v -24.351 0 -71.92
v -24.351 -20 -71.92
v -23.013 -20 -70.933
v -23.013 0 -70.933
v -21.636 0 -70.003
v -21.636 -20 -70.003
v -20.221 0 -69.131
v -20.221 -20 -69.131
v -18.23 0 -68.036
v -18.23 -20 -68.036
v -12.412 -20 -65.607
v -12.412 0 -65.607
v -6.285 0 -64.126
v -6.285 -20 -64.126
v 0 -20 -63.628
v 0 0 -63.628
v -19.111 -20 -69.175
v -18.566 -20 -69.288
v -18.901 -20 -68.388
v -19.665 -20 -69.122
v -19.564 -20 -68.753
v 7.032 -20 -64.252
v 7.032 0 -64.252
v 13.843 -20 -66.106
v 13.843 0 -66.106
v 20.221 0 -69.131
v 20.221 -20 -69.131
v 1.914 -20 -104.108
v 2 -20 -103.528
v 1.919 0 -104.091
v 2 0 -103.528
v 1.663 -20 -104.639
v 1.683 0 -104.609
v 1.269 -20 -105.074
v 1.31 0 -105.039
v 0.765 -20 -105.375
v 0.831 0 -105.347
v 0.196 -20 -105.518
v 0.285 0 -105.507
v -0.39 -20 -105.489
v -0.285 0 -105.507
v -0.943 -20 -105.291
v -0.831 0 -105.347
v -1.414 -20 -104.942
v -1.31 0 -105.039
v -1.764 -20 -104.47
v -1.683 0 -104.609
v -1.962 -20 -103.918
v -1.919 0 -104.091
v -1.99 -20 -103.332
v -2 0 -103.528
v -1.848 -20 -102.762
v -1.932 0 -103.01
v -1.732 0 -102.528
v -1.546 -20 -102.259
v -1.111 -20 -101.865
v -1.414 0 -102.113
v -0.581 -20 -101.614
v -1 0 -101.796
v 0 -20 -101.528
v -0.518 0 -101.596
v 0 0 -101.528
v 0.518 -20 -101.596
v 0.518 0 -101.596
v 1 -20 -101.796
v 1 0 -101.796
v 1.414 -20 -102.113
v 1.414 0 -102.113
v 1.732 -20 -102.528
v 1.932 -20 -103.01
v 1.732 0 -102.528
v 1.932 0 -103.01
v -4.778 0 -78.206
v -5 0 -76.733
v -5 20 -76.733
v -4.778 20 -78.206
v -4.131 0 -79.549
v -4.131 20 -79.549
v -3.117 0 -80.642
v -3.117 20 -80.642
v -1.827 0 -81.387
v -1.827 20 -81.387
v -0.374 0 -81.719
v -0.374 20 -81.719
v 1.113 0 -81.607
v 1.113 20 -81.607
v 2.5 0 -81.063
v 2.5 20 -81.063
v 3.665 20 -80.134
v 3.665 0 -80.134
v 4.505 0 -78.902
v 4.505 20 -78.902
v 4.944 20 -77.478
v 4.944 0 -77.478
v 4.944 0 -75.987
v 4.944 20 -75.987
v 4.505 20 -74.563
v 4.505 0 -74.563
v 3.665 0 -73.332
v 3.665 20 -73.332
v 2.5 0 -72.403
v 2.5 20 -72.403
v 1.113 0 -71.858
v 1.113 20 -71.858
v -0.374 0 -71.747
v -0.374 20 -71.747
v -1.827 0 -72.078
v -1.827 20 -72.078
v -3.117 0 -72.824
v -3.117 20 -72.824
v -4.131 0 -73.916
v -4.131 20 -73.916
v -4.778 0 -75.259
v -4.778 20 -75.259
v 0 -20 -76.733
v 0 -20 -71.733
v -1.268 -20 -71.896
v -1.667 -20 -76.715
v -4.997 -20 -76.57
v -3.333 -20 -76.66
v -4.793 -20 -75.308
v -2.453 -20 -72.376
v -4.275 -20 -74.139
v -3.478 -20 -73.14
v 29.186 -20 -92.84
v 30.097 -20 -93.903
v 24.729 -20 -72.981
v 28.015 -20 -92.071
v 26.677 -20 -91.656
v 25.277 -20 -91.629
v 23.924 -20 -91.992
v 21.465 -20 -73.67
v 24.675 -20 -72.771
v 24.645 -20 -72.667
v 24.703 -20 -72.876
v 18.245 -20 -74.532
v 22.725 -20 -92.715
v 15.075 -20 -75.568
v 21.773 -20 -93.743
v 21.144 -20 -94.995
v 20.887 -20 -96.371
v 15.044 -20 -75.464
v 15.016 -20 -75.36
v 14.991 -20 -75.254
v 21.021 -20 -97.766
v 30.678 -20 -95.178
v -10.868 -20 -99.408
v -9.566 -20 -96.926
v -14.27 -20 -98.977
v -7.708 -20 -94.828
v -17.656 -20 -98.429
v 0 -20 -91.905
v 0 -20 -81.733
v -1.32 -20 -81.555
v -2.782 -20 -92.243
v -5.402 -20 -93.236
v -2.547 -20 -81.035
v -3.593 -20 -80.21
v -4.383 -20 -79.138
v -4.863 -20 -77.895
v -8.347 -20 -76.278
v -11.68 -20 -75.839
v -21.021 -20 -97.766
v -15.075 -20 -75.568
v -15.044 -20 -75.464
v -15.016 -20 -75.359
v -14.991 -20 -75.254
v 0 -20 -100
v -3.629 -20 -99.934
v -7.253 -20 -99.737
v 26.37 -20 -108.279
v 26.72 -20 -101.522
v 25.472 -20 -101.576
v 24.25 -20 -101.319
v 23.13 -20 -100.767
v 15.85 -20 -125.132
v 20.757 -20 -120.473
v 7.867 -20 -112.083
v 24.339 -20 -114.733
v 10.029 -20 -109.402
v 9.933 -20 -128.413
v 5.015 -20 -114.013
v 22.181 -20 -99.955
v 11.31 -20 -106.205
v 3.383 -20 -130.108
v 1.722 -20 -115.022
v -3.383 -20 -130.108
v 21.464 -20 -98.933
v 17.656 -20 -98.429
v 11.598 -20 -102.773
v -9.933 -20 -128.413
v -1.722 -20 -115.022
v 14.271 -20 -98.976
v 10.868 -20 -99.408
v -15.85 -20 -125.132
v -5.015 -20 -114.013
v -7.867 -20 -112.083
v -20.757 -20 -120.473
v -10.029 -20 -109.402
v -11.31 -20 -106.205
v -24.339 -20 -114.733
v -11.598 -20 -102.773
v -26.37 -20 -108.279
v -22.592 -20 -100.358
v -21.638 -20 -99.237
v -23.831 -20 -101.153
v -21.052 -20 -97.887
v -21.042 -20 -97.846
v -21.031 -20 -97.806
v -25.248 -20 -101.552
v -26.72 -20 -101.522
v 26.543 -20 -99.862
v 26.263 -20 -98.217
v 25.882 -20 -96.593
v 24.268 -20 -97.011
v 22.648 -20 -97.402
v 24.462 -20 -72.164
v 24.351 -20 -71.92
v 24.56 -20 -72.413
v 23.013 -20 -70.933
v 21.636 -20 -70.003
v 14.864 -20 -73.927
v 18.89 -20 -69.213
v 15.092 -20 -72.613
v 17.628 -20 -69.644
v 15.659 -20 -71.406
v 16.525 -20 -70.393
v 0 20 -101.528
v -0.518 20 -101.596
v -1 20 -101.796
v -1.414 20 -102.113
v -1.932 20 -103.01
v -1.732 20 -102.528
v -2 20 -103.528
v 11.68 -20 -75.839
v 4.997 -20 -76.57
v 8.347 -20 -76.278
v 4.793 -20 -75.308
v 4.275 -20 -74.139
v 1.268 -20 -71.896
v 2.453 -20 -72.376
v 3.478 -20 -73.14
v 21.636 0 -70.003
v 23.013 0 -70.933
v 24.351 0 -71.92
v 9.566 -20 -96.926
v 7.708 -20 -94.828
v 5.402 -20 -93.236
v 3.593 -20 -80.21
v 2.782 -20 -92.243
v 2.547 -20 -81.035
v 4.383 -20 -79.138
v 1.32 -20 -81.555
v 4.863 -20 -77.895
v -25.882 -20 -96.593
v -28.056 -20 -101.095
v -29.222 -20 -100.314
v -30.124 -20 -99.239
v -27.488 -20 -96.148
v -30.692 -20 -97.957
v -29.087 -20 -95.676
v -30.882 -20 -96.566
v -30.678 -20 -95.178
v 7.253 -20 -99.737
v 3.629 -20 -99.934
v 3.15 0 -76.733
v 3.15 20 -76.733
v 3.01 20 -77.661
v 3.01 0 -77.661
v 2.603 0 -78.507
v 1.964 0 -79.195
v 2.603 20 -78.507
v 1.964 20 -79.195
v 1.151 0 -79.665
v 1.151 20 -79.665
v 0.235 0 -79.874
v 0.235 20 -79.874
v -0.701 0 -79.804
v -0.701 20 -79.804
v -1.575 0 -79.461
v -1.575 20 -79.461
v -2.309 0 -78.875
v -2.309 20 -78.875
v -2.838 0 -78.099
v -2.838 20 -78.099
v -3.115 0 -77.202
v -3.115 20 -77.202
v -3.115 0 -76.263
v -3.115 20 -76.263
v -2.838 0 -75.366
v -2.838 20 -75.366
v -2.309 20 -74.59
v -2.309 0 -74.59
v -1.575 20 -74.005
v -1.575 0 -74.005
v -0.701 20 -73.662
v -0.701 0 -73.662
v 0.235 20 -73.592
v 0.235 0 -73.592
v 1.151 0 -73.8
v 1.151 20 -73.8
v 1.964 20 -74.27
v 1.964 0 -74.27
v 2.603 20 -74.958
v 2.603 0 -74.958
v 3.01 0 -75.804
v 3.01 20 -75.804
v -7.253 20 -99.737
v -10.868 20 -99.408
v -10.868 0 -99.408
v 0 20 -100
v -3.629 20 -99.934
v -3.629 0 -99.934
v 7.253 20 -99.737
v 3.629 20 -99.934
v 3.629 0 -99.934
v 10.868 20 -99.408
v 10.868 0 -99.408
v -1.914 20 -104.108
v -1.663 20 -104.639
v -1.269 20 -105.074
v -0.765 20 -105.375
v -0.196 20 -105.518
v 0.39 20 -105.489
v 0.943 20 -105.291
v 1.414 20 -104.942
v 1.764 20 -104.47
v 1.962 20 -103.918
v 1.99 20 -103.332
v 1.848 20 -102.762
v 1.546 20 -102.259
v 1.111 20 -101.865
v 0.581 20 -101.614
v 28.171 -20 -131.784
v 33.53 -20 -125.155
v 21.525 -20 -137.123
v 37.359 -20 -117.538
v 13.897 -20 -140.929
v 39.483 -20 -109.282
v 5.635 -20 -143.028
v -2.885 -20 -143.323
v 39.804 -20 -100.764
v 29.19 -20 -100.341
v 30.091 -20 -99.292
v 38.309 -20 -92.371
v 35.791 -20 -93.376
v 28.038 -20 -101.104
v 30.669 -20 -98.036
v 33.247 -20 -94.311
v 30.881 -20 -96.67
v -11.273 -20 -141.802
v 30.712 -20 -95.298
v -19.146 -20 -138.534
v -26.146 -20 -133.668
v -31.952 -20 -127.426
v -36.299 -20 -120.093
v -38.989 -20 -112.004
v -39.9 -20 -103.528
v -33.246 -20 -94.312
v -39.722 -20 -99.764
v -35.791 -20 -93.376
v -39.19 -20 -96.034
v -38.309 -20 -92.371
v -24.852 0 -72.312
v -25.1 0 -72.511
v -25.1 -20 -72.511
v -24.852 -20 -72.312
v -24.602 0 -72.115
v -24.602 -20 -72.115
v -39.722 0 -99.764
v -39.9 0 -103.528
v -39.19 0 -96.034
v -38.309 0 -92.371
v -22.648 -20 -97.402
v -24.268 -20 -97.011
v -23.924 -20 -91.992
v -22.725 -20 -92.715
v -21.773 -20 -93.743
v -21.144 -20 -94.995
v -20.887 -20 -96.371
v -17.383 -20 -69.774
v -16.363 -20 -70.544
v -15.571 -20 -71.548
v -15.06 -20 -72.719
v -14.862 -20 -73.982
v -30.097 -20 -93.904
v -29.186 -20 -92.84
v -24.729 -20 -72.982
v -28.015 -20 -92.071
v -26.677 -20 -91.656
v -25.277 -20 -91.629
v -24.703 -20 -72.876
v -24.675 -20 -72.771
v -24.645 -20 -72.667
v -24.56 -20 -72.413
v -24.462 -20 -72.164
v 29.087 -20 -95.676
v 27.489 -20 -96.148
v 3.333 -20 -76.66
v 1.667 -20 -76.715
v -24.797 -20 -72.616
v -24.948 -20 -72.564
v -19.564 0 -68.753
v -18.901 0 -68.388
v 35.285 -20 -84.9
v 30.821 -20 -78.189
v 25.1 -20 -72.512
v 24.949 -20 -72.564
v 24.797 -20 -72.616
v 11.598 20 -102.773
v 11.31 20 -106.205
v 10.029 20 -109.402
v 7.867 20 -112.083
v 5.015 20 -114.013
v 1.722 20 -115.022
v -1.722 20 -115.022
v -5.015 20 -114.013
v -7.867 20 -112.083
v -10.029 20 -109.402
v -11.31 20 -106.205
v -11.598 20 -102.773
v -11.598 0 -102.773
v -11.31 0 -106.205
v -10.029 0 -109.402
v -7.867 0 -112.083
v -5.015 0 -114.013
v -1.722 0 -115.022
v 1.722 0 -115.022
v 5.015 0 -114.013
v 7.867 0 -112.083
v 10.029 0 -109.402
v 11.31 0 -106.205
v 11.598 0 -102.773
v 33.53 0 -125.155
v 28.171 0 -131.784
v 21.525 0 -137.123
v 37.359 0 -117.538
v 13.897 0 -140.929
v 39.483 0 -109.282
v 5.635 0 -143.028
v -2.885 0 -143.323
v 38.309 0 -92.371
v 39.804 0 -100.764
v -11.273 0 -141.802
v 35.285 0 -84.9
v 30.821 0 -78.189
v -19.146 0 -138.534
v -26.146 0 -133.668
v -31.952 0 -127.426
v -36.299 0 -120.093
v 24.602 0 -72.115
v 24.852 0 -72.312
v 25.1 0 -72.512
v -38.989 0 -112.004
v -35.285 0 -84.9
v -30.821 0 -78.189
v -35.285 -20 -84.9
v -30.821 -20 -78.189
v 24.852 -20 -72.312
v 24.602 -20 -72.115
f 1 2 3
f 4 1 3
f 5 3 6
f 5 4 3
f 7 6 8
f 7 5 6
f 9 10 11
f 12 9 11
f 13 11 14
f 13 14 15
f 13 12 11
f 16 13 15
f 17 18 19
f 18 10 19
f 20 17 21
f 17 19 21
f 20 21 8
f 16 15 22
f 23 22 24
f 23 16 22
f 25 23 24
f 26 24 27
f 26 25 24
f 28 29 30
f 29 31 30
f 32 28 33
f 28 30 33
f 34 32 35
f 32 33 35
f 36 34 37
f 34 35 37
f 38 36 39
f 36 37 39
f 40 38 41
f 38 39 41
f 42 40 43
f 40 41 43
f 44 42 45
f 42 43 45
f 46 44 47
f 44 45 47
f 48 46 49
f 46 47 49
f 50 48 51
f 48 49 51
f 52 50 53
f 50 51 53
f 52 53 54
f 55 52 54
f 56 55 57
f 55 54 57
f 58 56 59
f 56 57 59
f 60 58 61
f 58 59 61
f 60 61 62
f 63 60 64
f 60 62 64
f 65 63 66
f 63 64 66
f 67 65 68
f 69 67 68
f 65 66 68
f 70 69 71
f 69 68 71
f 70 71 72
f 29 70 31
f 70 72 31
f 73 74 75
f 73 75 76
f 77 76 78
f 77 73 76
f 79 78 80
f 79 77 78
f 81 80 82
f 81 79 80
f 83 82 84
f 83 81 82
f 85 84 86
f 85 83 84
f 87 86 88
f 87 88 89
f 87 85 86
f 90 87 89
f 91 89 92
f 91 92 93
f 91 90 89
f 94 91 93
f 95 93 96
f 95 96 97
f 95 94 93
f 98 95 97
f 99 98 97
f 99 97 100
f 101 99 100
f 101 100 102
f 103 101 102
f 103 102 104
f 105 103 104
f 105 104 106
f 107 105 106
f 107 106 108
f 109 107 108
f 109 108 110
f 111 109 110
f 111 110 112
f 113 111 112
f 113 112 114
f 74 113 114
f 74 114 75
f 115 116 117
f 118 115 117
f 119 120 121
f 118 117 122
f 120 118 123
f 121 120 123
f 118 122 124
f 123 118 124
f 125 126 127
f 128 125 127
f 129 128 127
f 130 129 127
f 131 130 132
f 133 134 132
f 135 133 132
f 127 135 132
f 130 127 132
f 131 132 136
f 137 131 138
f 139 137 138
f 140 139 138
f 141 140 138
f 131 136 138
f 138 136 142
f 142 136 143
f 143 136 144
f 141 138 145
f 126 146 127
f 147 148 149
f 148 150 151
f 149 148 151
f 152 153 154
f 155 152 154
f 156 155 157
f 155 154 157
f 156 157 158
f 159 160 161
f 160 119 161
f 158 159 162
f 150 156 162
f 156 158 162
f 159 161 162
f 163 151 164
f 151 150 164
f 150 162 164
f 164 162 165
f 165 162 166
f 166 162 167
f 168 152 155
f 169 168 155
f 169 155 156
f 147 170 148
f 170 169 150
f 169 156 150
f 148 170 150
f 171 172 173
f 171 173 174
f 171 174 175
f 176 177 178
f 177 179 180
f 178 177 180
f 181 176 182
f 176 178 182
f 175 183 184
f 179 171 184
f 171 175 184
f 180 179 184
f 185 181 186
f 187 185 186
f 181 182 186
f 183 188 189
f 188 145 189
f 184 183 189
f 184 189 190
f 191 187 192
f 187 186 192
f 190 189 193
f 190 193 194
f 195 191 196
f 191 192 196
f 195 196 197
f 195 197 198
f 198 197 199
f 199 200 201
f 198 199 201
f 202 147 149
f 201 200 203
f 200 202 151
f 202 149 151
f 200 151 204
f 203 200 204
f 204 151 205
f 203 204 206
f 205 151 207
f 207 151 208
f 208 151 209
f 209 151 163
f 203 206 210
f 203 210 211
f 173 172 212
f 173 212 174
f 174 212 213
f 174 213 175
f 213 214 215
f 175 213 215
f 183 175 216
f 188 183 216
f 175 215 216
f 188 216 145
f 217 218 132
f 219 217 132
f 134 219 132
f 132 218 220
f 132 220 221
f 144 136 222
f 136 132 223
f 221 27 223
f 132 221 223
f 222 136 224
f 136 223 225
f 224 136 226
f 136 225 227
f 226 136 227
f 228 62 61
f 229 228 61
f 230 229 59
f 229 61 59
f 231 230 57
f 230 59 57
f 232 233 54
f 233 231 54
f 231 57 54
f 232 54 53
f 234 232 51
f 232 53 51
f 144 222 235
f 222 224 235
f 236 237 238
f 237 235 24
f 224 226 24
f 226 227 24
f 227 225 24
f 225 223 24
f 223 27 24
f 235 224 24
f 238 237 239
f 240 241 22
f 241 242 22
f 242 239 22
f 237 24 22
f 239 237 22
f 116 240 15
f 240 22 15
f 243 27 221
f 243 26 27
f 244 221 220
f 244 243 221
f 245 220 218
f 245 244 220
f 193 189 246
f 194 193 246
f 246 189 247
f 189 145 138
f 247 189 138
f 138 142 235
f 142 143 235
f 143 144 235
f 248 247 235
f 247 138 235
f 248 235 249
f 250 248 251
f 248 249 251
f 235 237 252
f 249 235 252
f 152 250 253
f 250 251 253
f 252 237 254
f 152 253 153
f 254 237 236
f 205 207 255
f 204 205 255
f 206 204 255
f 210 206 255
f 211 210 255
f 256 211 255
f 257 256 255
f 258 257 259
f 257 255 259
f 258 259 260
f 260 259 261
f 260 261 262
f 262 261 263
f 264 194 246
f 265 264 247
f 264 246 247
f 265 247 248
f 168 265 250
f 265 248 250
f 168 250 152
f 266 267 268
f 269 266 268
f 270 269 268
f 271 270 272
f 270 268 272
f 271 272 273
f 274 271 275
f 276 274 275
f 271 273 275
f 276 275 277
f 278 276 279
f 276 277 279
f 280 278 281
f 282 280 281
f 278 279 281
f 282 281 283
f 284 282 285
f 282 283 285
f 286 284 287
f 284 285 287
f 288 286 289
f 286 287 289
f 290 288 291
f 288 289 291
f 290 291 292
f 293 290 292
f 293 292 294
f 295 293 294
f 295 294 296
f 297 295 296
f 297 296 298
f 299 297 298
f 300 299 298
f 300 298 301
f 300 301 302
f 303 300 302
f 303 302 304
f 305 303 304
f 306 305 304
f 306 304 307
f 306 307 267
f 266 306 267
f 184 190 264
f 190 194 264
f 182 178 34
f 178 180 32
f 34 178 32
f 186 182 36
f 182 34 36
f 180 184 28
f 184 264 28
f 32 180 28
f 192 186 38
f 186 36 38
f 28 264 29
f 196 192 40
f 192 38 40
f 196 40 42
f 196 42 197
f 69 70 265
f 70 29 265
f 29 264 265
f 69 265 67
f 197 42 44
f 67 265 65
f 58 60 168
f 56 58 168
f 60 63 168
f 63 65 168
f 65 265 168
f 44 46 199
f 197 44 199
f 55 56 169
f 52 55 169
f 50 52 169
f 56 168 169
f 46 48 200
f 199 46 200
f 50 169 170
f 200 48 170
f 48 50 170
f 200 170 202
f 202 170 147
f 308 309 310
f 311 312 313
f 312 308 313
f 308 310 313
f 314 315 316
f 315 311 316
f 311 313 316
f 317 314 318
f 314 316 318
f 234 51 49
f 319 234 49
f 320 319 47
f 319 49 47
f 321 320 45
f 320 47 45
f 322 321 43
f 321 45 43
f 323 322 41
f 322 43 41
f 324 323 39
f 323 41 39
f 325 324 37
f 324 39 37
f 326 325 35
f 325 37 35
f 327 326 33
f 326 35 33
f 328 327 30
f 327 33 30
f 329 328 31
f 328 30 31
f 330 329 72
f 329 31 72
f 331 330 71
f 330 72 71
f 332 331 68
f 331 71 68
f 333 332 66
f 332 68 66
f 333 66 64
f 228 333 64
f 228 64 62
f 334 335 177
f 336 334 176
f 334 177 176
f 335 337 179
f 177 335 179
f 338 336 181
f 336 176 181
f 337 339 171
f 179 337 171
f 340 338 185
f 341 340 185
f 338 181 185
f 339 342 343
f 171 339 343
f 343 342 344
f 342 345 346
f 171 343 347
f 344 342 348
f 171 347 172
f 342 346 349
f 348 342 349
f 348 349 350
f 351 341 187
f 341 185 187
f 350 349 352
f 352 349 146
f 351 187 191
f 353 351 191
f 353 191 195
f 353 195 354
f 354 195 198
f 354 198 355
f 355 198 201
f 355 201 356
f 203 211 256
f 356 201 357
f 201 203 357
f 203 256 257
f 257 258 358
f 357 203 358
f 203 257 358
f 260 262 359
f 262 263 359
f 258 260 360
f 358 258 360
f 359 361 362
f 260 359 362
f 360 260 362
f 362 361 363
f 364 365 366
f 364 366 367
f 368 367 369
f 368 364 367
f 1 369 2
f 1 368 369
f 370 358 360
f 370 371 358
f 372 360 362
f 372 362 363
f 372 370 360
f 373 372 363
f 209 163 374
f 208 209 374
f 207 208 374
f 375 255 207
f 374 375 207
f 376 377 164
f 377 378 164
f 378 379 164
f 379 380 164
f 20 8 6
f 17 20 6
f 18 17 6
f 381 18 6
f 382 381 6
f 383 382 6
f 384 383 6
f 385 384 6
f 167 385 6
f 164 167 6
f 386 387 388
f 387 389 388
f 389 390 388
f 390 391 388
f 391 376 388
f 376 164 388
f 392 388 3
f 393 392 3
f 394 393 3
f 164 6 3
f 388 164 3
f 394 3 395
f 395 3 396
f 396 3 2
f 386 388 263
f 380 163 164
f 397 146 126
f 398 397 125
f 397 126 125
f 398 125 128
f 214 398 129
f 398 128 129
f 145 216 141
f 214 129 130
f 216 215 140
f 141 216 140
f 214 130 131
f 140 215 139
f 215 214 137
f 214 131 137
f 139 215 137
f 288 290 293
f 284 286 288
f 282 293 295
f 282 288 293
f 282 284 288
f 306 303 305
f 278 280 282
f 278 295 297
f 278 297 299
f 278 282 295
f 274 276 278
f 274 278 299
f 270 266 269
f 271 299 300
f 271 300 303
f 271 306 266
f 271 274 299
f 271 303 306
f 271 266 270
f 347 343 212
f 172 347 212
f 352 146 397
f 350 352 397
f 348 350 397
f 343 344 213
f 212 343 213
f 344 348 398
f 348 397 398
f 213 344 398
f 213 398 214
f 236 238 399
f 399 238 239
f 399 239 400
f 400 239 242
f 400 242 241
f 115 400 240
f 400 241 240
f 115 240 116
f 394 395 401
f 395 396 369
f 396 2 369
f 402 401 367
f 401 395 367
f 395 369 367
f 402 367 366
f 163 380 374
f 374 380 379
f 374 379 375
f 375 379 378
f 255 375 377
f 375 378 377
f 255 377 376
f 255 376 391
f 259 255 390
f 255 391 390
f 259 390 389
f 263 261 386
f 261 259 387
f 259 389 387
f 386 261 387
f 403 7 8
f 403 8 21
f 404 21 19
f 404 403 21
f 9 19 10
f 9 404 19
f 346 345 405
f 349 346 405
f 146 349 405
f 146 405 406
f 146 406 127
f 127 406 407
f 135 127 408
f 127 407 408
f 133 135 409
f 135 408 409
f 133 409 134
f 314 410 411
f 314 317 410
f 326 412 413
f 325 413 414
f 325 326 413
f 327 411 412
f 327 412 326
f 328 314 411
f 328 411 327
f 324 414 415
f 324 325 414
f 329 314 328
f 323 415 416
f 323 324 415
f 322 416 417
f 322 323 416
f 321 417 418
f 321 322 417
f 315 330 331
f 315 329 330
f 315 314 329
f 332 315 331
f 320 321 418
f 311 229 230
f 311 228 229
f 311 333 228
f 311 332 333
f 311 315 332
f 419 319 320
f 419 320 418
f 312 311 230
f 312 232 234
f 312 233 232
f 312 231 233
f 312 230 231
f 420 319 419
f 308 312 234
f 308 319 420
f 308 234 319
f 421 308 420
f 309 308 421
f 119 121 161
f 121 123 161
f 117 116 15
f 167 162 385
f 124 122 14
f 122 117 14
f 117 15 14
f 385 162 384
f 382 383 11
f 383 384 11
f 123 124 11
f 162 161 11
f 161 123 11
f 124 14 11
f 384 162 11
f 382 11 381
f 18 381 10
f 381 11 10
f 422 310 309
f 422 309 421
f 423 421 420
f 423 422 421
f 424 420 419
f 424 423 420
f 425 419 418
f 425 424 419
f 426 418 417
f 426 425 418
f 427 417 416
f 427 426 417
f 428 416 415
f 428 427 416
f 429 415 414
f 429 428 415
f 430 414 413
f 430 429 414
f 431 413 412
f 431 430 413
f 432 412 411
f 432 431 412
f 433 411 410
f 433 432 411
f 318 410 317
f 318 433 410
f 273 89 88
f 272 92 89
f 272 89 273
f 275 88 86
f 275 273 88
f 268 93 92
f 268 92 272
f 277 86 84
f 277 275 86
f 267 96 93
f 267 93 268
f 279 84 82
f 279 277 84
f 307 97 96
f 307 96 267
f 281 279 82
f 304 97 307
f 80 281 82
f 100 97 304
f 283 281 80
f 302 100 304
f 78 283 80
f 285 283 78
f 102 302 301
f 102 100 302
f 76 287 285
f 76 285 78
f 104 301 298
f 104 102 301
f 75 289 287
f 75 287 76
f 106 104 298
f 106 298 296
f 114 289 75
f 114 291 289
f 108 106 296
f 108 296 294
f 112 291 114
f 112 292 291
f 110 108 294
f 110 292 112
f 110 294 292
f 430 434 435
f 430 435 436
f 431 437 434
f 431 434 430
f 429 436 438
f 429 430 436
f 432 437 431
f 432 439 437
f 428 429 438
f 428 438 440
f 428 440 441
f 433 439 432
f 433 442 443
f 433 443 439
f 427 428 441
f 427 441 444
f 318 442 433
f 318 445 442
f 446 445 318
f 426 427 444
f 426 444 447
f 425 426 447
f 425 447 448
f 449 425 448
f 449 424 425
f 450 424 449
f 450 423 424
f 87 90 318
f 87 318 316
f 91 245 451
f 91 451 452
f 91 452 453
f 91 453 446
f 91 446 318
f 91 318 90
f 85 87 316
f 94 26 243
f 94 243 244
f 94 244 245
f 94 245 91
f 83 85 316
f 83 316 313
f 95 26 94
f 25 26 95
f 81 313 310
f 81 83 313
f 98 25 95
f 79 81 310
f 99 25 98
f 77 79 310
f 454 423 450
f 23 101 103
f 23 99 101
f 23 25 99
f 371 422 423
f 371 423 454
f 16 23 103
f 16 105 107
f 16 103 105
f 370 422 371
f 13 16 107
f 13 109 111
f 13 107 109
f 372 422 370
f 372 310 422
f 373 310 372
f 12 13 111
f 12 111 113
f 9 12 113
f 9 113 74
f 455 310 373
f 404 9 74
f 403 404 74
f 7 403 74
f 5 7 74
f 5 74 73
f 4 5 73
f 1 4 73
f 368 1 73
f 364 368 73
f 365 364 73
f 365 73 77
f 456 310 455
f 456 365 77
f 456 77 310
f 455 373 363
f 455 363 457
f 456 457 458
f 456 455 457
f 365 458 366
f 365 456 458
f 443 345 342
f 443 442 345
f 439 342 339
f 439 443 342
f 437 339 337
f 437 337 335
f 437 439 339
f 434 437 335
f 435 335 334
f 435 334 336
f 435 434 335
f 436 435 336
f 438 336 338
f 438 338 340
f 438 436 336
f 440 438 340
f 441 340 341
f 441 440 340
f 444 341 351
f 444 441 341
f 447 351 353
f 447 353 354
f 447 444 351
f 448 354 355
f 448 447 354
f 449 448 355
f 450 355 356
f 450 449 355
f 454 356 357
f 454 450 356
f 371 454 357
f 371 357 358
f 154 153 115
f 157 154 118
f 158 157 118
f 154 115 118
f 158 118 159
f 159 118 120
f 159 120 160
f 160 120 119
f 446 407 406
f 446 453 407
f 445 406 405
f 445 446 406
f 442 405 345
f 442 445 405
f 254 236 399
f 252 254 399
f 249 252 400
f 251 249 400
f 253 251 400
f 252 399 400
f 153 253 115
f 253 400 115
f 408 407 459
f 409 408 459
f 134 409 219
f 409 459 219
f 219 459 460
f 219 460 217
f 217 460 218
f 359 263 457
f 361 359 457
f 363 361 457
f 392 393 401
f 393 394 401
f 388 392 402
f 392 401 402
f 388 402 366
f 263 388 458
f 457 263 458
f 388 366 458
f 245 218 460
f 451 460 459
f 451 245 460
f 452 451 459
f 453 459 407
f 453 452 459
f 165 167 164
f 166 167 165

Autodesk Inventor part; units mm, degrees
ref_plane "YZ Plane" through (0, 0, 0) normal (1, 0, 0) x (0, 1, 0)
ref_plane "XZ Plane" through (0, 0, 0) normal (0, 1, 0) x (-1, 0, 0)
ref_plane "XY Plane" through (0, 0, 0) normal (0, 0, 1) x (1, 0, 0)
sketch "Sketch1" plane through (0, 0, 0) normal (0, 1, 0) x (-1, 0, 0)
  circle A0 centre (0, 0) radius 100
  line L0 (0, 0) -> (18.5658, -69.2885)
  line L1 (0, 0) -> (0, -103.5276)
  arc A1 (24.6448, -72.6673) -> (14.9907, -75.2542) centre (0, 0) ccw
  circle A2 centre (25.8819, -96.5926) radius 5
  arc A3 (24.729, -72.9816) -> (15.0747, -75.5678) centre (19.8599, -74.1181) ccw
  line L2 (30.6777, -95.1782) -> (24.6448, -72.6673)
  line L3 (21.0523, -97.8867) -> (14.9907, -75.2542)
  circle A4 centre (0, -103.5276) radius 11.6229
  line L4 (21.0523, -97.8867) -> (25.8819, -96.5926)
  arc A5 (-25.8819, -96.5926) -> (26.7197, -101.5219) centre (0, -103.5276) ccw
  circle A6 centre (0, -103.5276) radius 39.9
  arc A7 (57.9067, -50.8394) -> (50.8389, -57.9063) centre (54.2582, -54.2582) ccw
  line L5 (67.1751, -74.2462) -> (50.6094, -57.6767)
  line L6 (74.1567, -67.0879) -> (57.6767, -50.6094)
  circle A8 centre (70.7107, -70.7107) radius 5
  circle A9 centre (51.7638, -89.6575) radius 11.6229
  arc A10 (75.5684, -15.0748) -> (72.9809, -24.7289) centre (74.1181, -19.8599) ccw
  line L7 (95.2985, -30.7115) -> (72.6673, -24.6448)
  line L8 (97.7655, -21.0214) -> (75.2542, -14.9907)
  circle A11 centre (96.5926, -25.8819) radius 5
  circle A12 centre (89.6575, -51.7638) radius 11.6229
  arc A13 (72.9816, 24.729) -> (75.5678, 15.0747) centre (74.1181, 19.8599) ccw
  line L9 (97.8867, 21.0523) -> (75.2542, 14.9907)
  line L10 (95.1782, 30.6777) -> (72.6673, 24.6448)
  circle A14 centre (96.5926, 25.8819) radius 5
  circle A15 centre (103.5276, 0) radius 11.6229
  arc A16 (50.8394, 57.9067) -> (57.9063, 50.8389) centre (54.2582, 54.2582) ccw
  line L11 (74.2462, 67.1751) -> (57.6767, 50.6094)
  line L12 (67.0879, 74.1567) -> (50.6094, 57.6767)
  circle A17 centre (70.7107, 70.7107) radius 5
  circle A18 centre (89.6575, 51.7638) radius 11.6229
  arc A19 (15.0748, 75.5684) -> (24.7289, 72.9809) centre (19.8599, 74.1181) ccw
  line L13 (30.7115, 95.2985) -> (24.6448, 72.6673)
  line L14 (21.0214, 97.7655) -> (14.9907, 75.2542)
  circle A20 centre (25.8819, 96.5926) radius 5
  circle A21 centre (51.7638, 89.6575) radius 11.6229
  arc A22 (-24.729, 72.9816) -> (-15.0747, 75.5678) centre (-19.8599, 74.1181) ccw
  line L15 (-21.0523, 97.8867) -> (-14.9907, 75.2542)
  line L16 (-30.6777, 95.1782) -> (-24.6448, 72.6673)
  circle A23 centre (-25.8819, 96.5926) radius 5
  circle A24 centre (0, 103.5276) radius 11.6229
  arc A25 (-57.9067, 50.8394) -> (-50.8389, 57.9063) centre (-54.2582, 54.2582) ccw
  line L17 (-67.1751, 74.2462) -> (-50.6094, 57.6767)
  line L18 (-74.1567, 67.0879) -> (-57.6767, 50.6094)
  circle A26 centre (-70.7107, 70.7107) radius 5
  circle A27 centre (-51.7638, 89.6575) radius 11.6229
  arc A28 (-75.5684, 15.0748) -> (-72.9809, 24.7289) centre (-74.1181, 19.8599) ccw
  line L19 (-95.2985, 30.7115) -> (-72.6673, 24.6448)
  line L20 (-97.7655, 21.0214) -> (-75.2542, 14.9907)
  circle A29 centre (-96.5926, 25.8819) radius 5
  circle A30 centre (-89.6575, 51.7638) radius 11.6229
  arc A31 (-72.9816, -24.729) -> (-75.5678, -15.0747) centre (-74.1181, -19.8599) ccw
  line L21 (-97.8867, -21.0523) -> (-75.2542, -14.9907)
  line L22 (-95.1782, -30.6777) -> (-72.6673, -24.6448)
  circle A32 centre (-96.5926, -25.8819) radius 5
  circle A33 centre (-103.5276, 0) radius 11.6229
  arc A34 (-50.8394, -57.9067) -> (-57.9063, -50.8389) centre (-54.2582, -54.2582) ccw
  line L23 (-74.2462, -67.1751) -> (-57.6767, -50.6094)
  line L24 (-67.0879, -74.1567) -> (-50.6094, -57.6767)
  circle A35 centre (-70.7107, -70.7107) radius 5
  circle A36 centre (-89.6575, -51.7638) radius 11.6229
  arc A37 (-15.0748, -75.5684) -> (-24.7289, -72.9809) centre (-19.8599, -74.1181) ccw
  line L25 (-30.7115, -95.2985) -> (-24.6448, -72.6673)
  line L26 (-21.0214, -97.7655) -> (-14.9907, -75.2542)
  circle A38 centre (-25.8819, -96.5926) radius 5
  circle A39 centre (-51.7638, -89.6575) radius 11.6229
  circle A40 centre (0, 0) radius 5
  circle A41 centre (0, -103.5276) radius 2
  circle A42 centre (0, -76.7327) radius 5
  point P0 (50.7227, -50.7227)
  point P1 (73.9009, -74.5607)
  point P2 (69.2885, -18.5658)
  point P3 (101.2804, -27.621)
  point P4 (69.2885, 18.5658)
  point P5 (101.5219, 26.7197)
  point P6 (50.7227, 50.7227)
  point P7 (74.5607, 73.9009)
  point P8 (18.5658, 69.2885)
  point P9 (27.621, 101.2804)
  point P10 (-18.5658, 69.2885)
  point P11 (-26.7197, 101.5219)
  point P12 (-50.7227, 50.7227)
  point P13 (-73.9009, 74.5607)
  point P14 (-69.2885, 18.5658)
  point P15 (-101.2804, 27.621)
  point P16 (-69.2885, -18.5658)
  point P17 (-101.5219, -26.7197)
  point P18 (-50.7227, -50.7227)
  point P19 (-74.5607, -73.9009)
  point P20 (-18.5658, -69.2885)
  point P21 (-27.621, -101.2804)
  point P22 (40.2917, -91.5236)
  point P23 (59.1159, -80.6555)
  point P24 (67.0867, -74.1578)
  point P25 (80.6555, -59.1159)
  point P26 (91.5236, -40.2917)
  point P27 (95.1777, -30.6791)
  point P28 (99.4077, -10.8682)
  point P29 (99.4077, 10.8682)
  point P30 (97.7659, 21.0199)
  point P31 (91.5236, 40.2917)
  point P32 (80.6555, 59.1159)
  point P33 (74.1578, 67.0867)
  point P34 (59.1159, 80.6555)
  point P35 (40.2917, 91.5236)
  point P36 (30.6791, 95.1777)
  point P37 (10.8682, 99.4077)
  point P38 (-10.8682, 99.4077)
  point P39 (-21.0199, 97.7659)
  point P40 (-40.2917, 91.5236)
  point P41 (-59.1159, 80.6555)
  point P42 (-67.0867, 74.1578)
  point P43 (-80.6555, 59.1159)
  point P44 (-91.5236, 40.2917)
  point P45 (-95.1777, 30.6791)
  point P46 (-99.4077, 10.8682)
  point P47 (-99.4077, -10.8682)
  point P48 (-97.7659, -21.0199)
  point P49 (-91.5236, -40.2917)
  point P50 (-80.6555, -59.1159)
  point P51 (-74.1578, -67.0867)
  point P52 (-59.1159, -80.6555)
  point P53 (-40.2917, -91.5236)
  point P54 (-30.6791, -95.1777)
  point P55 (-10.8682, -99.4077)
  point P56 (10.8682, -99.4077)
  point P57 (21.0199, -97.7659)
  point P58 (-10.8682, -99.4077)
  point P59 (10.8682, -99.4077)
  dimension "d2" = 200
  dimension "d3" = 15
  dimension "d4" = 10
  dimension "d5" = 10
  dimension "d6" = 79.8
  dimension "d7" = 360
  dimension "d8" = 10
  dimension "d9" = 4
  dimension "d14" = 10
extrude "Extrusion1" add sketch "Sketch1" along normal blind 20 contours A0 A4
extrude "Extrusion2" add sketch "Sketch1" against normal blind 20 contours A0 A38 | A5 A38 L25 A0 | A0 A38 A5 | L26 A37 A1 A42 L1 A4 A0 | A38 L25 A37 A1 L26 | A0 A4 A2 A5 A38 | L25 A38 A5 A2 A0 A6 | A0 A6 A1 A37 L25 | A4 L1 A0 | A41 | A0 A4 | A2 L4 A0 | L1 A4 A0 | L1 A42 A1 A3 L3 A0 A4 | A37 A6 L1 A42 A1 | A1 A37 A6 | A6 A37 A1 | A2 A0 L4 | A42 A1 L1 | L1 A1 A42 | A42 L1 A1 | A0 L2 A3 A1 A6 | A2 A0 | L3 A3 A6 L2 A2 | L1 A42 A1 | L1 A6 L0 A3 A1 A42 | A1 A3 A6 | A3 L3 | A6 A3 L0
sketch "Sketch2" plane through (0, 0, -103.5276) normal (0, 1, 0) x (1, 0, 0)
  circle A0 centre (0, 0) radius 2 projected
  circle A1 centre (0, 0) radius 2.5
  point P0 (0, -103.5276)
extrude "Extrusion3" cut sketch "Sketch2" against normal blind 20 contours A0
extrude "Extrusion5" add sketch "Sketch1" along normal blind 20 contours A42 A1 L1 | L1 A1 A42 | A42 L1 A1 | L1 A42 A1
sketch "Sketch4" plane through (0, 20, -76.7327) normal (0, 1, 0) x (1, 0, 0)
  circle A0 centre (0, 0) radius 3.15
  point P0 (0, -76.7327)
  dimension "d22" = 6.3
extrude "Extrusion6" cut sketch "Sketch4" against normal blind 20
properties part number "Geneva Circle arc 12"
